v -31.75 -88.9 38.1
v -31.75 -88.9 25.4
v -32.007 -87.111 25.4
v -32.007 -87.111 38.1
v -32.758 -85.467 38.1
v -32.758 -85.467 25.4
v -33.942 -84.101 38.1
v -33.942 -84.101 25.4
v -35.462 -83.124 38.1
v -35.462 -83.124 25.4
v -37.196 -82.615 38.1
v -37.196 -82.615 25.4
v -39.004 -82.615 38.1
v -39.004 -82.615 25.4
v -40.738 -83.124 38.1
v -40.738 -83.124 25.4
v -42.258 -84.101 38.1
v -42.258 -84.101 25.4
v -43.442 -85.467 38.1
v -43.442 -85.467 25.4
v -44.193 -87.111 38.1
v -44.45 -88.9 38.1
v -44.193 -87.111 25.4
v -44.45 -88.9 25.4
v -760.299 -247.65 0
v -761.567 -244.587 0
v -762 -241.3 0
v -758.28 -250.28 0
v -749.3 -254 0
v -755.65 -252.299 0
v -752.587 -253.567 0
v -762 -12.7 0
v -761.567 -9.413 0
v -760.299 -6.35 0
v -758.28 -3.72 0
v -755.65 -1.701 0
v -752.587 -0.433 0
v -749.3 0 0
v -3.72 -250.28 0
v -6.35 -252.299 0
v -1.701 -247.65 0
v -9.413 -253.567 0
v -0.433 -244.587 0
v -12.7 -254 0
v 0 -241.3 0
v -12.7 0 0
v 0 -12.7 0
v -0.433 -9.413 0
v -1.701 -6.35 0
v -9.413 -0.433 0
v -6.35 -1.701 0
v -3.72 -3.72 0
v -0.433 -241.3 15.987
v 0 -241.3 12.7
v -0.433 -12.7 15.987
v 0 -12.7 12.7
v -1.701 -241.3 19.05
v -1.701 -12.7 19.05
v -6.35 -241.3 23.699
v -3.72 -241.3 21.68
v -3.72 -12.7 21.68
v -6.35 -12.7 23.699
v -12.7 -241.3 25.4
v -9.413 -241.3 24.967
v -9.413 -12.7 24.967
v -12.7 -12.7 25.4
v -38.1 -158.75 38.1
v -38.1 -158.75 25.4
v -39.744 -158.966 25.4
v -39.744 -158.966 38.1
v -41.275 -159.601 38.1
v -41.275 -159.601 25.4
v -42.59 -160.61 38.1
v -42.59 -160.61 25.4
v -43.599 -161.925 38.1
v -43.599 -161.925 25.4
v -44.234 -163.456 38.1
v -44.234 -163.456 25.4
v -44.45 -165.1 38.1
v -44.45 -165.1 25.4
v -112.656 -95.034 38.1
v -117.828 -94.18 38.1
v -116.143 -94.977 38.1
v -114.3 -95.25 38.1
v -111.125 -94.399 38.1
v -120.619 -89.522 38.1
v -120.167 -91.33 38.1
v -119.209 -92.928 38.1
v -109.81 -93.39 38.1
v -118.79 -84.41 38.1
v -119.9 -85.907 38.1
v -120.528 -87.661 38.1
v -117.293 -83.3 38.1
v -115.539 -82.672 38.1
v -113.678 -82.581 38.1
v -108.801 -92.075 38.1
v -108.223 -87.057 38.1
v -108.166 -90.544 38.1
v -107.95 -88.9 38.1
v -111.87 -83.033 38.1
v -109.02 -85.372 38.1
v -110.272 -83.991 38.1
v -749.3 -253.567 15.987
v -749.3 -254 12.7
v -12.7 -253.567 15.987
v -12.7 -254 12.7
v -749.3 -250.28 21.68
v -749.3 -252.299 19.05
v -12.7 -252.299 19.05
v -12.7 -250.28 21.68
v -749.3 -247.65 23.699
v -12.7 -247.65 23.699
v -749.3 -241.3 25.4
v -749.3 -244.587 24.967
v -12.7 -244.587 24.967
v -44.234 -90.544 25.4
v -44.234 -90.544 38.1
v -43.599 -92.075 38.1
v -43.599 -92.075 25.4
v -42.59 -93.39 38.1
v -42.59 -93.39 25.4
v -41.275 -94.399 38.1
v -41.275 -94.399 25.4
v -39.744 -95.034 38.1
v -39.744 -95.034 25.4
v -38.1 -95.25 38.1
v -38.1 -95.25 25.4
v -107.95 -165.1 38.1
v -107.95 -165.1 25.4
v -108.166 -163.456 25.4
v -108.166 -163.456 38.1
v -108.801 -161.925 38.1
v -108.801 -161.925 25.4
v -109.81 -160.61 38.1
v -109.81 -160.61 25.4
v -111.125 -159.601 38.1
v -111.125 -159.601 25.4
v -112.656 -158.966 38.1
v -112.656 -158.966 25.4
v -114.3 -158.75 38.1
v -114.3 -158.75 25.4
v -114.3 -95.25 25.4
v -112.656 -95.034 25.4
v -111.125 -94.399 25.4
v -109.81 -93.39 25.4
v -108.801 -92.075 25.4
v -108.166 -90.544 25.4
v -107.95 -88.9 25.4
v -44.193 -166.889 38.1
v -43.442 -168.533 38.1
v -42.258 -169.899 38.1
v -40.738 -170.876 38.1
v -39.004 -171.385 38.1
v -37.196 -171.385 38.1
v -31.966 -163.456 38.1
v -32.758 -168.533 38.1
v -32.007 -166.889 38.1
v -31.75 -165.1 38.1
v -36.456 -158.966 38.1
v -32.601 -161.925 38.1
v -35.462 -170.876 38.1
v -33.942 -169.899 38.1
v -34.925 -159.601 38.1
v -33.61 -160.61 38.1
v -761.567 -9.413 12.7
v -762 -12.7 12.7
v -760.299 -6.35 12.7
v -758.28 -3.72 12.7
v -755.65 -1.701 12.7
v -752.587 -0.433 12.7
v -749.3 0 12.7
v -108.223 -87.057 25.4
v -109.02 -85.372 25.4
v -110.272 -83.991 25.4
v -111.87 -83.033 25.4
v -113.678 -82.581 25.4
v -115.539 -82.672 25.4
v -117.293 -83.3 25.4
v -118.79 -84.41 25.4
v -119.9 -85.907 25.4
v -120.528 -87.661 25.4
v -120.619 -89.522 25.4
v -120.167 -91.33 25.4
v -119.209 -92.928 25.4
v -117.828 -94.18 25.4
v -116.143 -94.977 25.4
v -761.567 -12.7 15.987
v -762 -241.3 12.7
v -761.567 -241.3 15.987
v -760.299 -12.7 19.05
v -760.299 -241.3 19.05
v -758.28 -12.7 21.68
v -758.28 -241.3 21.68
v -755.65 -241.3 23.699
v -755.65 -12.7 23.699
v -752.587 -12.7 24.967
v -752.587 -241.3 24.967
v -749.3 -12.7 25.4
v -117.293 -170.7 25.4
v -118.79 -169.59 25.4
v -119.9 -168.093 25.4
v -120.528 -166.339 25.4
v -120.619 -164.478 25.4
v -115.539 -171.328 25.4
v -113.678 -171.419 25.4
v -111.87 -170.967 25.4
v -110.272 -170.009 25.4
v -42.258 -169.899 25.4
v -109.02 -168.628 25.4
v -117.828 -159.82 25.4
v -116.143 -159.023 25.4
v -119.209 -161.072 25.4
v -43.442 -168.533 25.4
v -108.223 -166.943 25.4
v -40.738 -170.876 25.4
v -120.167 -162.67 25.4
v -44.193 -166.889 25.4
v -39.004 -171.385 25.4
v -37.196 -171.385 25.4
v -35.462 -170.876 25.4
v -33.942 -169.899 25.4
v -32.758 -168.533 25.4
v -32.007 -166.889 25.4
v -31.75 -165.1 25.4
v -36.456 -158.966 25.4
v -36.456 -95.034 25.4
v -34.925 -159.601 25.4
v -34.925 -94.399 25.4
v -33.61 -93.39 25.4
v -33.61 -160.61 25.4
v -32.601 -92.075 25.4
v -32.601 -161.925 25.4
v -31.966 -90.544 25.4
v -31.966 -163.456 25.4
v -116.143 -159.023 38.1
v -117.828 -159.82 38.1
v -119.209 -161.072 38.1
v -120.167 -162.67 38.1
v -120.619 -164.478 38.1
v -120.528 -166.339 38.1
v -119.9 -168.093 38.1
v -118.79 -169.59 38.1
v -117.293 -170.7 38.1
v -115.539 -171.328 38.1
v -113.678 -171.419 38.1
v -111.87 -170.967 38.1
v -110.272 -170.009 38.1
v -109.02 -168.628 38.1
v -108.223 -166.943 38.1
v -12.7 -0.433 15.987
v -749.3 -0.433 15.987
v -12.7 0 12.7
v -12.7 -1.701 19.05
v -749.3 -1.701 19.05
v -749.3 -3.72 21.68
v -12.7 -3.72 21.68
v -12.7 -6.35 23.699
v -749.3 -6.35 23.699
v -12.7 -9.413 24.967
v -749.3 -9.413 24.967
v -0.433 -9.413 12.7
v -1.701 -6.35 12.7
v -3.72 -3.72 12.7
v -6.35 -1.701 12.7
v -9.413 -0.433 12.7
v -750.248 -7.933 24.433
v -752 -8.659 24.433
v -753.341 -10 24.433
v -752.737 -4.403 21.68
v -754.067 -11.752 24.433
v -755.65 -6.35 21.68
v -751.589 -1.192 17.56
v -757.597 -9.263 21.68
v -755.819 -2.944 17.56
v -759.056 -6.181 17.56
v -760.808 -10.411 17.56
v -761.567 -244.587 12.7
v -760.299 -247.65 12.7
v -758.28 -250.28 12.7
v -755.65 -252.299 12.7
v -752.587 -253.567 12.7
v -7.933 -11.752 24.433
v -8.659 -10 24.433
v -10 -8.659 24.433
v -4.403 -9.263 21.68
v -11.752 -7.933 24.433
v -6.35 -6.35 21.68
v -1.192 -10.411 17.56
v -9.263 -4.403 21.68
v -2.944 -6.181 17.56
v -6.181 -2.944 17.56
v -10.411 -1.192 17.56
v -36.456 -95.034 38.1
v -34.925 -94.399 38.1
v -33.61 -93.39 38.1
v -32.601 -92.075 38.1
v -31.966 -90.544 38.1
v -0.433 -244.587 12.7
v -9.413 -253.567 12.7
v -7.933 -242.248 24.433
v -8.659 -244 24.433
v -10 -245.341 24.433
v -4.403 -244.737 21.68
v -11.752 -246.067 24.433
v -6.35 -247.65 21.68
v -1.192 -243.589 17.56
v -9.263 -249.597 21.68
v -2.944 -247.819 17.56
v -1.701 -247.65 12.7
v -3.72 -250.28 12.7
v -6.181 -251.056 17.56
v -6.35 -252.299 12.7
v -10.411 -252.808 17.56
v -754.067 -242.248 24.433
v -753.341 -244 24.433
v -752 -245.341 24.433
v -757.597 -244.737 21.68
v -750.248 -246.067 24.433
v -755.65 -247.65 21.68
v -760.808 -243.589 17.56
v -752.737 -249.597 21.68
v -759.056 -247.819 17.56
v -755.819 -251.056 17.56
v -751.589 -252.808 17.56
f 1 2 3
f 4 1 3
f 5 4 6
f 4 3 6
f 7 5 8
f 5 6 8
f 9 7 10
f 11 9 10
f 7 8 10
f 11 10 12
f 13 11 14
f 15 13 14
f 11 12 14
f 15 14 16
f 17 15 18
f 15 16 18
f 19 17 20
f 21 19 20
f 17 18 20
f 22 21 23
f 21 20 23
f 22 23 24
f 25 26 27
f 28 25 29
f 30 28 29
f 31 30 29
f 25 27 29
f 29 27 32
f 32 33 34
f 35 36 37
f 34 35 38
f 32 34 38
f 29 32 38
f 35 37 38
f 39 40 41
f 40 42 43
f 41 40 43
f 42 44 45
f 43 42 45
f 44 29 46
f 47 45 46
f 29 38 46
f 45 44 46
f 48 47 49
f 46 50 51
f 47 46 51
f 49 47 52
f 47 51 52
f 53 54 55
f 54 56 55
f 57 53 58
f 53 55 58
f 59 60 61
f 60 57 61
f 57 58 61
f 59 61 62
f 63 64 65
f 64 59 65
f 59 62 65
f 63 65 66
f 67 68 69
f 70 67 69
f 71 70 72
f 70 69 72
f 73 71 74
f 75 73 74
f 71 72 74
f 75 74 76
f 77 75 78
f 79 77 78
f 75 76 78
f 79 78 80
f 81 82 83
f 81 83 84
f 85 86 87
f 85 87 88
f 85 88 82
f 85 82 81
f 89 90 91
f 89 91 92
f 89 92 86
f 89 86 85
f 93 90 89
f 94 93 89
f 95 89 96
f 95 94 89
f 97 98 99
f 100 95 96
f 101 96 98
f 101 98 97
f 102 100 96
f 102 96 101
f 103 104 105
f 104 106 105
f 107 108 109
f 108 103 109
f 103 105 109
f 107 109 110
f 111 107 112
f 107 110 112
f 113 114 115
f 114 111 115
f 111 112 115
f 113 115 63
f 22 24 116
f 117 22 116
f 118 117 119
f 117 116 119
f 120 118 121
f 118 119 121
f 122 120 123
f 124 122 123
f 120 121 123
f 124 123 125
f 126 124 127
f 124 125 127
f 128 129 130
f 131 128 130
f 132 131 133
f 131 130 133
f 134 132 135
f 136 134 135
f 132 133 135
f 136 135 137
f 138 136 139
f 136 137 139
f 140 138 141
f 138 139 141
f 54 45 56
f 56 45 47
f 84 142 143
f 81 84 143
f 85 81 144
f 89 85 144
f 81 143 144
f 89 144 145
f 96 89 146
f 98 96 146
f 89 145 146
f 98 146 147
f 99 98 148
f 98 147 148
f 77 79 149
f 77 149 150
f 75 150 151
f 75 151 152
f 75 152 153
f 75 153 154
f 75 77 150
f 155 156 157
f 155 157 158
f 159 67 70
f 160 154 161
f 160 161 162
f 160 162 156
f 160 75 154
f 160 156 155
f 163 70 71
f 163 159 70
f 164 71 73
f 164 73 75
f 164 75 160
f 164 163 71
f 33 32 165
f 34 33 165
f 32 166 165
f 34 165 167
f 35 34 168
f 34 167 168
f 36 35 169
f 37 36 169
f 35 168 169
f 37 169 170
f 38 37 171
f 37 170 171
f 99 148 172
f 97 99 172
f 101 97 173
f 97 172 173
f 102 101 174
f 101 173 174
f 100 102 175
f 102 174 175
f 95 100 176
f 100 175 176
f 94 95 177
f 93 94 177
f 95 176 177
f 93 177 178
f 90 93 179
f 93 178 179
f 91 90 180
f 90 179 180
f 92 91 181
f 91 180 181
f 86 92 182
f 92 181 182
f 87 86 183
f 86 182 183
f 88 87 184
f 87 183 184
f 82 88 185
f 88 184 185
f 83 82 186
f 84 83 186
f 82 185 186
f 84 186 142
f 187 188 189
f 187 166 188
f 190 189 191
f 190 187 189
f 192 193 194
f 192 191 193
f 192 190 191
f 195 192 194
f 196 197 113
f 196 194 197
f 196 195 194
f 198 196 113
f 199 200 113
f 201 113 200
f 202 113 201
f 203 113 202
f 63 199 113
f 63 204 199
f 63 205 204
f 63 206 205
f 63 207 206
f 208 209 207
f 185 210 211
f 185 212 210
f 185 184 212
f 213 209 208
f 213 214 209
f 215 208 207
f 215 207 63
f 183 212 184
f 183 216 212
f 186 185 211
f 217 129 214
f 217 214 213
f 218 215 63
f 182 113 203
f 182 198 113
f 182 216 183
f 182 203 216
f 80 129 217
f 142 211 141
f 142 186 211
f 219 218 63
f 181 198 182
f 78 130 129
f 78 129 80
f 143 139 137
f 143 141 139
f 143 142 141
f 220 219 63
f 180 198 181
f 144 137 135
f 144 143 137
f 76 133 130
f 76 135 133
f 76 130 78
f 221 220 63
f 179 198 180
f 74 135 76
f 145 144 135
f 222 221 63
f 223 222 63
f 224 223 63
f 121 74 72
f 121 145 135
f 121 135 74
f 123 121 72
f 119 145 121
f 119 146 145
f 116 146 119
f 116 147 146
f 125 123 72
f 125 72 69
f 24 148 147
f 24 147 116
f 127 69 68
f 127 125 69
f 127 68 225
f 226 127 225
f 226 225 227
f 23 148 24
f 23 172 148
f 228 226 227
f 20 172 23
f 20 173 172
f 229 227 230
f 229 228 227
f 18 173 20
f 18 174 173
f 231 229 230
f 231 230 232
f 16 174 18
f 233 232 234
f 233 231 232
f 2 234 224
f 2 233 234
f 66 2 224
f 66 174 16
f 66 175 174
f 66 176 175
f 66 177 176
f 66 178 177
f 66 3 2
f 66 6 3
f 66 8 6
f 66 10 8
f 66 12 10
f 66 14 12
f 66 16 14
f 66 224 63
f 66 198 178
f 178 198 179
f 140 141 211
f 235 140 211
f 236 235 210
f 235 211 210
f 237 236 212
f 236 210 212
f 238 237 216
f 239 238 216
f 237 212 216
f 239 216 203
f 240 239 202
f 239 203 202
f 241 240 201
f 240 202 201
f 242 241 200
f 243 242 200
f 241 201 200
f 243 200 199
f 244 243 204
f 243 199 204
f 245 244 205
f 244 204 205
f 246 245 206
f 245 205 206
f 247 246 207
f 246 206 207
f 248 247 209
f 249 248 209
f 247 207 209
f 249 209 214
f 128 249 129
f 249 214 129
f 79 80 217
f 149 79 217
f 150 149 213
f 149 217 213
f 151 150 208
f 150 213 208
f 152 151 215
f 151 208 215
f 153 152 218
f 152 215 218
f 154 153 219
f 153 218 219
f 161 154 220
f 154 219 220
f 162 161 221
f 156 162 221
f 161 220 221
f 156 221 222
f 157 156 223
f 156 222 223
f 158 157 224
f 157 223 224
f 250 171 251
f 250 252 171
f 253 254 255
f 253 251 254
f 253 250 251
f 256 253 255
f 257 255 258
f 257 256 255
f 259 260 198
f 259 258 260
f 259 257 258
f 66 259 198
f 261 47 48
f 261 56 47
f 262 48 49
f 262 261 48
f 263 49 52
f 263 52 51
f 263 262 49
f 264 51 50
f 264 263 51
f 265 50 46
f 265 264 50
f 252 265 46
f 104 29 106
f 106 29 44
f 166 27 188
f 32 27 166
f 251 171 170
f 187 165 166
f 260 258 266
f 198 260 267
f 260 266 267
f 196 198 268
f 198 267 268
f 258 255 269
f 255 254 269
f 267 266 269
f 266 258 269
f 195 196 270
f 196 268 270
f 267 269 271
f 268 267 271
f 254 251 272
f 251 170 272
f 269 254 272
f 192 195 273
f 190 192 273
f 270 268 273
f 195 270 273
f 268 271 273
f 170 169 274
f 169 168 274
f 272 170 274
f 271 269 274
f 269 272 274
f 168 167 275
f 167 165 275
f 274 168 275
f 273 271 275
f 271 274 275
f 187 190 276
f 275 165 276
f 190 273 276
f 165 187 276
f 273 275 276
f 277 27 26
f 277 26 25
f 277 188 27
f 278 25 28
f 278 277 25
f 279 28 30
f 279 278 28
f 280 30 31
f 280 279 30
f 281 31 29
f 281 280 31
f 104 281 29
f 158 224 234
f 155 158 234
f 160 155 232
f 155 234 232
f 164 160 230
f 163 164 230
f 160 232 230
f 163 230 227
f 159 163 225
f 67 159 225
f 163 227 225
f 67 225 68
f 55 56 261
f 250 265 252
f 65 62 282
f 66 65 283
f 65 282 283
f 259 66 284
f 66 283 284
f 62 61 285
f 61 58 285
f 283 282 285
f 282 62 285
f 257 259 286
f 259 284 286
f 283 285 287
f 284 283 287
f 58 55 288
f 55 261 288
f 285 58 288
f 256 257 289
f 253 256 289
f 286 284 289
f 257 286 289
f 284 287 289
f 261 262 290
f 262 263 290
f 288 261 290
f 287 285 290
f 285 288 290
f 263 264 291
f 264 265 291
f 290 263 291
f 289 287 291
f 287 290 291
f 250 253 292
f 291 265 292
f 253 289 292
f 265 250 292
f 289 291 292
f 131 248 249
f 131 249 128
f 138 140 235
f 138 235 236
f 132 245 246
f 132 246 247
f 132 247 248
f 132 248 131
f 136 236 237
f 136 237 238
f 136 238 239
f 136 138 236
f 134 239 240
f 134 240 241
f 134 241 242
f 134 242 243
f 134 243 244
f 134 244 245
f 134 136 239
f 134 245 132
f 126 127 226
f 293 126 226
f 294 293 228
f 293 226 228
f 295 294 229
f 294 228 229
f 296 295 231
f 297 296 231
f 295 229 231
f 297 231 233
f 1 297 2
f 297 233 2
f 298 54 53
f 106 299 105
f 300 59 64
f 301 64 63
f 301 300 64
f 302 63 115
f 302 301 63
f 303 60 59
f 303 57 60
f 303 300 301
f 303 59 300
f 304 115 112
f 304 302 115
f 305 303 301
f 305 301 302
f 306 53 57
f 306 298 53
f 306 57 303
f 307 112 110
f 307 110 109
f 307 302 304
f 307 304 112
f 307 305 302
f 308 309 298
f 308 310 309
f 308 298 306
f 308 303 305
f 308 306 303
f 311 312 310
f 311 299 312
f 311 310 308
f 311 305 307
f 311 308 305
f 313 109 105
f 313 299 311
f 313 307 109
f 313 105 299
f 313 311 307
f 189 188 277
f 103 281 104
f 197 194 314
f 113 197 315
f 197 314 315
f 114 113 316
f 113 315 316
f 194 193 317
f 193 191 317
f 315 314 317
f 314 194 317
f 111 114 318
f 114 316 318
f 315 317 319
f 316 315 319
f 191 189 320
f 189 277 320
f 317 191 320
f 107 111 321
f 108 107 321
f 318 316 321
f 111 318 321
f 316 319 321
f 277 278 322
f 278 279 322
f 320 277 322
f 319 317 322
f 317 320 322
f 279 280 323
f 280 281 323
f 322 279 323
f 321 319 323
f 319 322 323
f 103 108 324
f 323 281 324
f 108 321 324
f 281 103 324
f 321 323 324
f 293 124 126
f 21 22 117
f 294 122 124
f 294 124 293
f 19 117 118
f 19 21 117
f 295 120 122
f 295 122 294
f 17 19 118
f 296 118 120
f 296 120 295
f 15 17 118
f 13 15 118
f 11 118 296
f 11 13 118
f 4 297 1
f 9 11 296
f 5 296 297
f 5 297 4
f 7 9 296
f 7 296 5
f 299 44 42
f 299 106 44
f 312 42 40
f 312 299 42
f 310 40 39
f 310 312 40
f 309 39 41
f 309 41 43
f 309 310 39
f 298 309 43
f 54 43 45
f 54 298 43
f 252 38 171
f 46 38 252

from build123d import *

# Parameters (mm, degrees)
F0_W     = 762
F0_H     = 254
F1_DEPTH = 25.4
F3_R     = 12.7
F5_DEPTH = 12.7


# Not quite as in the source:
# - a feature of the source that left no trace in its solid (it failed there, or was rolled back) is left out


with BuildPart() as f1:
    # F0 (on Top) → F1 (new body)
    with BuildSketch(Plane.XY):
        with Locations((-381, -127)):
            Rectangle(F0_W, F0_H)
    extrude(amount=F1_DEPTH)

    # F3
    f3_edges = [f1.edges().sort_by_distance(p)[0] for p in [
        (-762, -254, 12.7),
        (0, -254, 12.7),
        (0, 0, 12.7),
        (0, -127, 25.4),
        (-762, 0, 12.7),
        (-381, 0, 25.4),
        (-762, -127, 25.4),
        (-381, -254, 25.4),
    ]]
    fillet(f3_edges, radius=F3_R)

    # F4 (on face) → F5 (join)
    with BuildSketch(Plane.XY.offset(25.4)):
        with BuildLine():
            Line((-44.45, -165.1), (-38.1, -165.1))
            Line((-38.1, -165.1), (-38.1, -158.75))
            ThreePointArc((-38.1, -158.75), (-42.5901280605, -160.6098719395), (-44.45, -165.1))
        make_face()
        with BuildLine():
            ThreePointArc((-44.45, -165.1), (-38.1, -171.45), (-31.75, -165.1))
            Line((-31.75, -165.1), (-38.1, -165.1))
            Line((-38.1, -165.1), (-44.45, -165.1))
        make_face()
        with BuildLine():
            Line((-38.1, -165.1), (-31.75, -165.1))
            ThreePointArc((-31.75, -165.1), (-33.6098719395, -160.6098719395), (-38.1, -158.75))
            Line((-38.1, -158.75), (-38.1, -165.1))
        make_face()
        with BuildLine():
            Line((-114.3, -165.1), (-107.95, -165.1))
            ThreePointArc((-107.95, -165.1), (-109.8098719395, -160.6098719395), (-114.3, -158.75))
            Line((-114.3, -158.75), (-114.3, -165.1))
        make_face()
        with BuildLine():
            ThreePointArc((-114.3, -158.75), (-118.7901280605, -169.5901280605), (-107.95, -165.1))
            Line((-107.95, -165.1), (-114.3, -165.1))
            Line((-114.3, -165.1), (-114.3, -158.75))
        make_face()
        with BuildLine():
            ThreePointArc((-114.3, -95.25), (-109.8098719395, -93.3901280605), (-107.95, -88.9))
            Line((-107.95, -88.9), (-114.3, -88.9))
            Line((-114.3, -88.9), (-114.3, -95.25))
        make_face()
        with BuildLine():
            Line((-114.3, -88.9), (-107.95, -88.9))
            ThreePointArc((-107.95, -88.9), (-118.7901280605, -84.4098719395), (-114.3, -95.25))
            Line((-114.3, -95.25), (-114.3, -88.9))
        make_face()
        with BuildLine():
            Line((-38.1, -88.9), (-31.75, -88.9))
            ThreePointArc((-31.75, -88.9), (-38.1, -82.55), (-44.45, -88.9))
            Line((-44.45, -88.9), (-38.1, -88.9))
        make_face()
        with BuildLine():
            Line((-38.1, -95.25), (-38.1, -88.9))
            Line((-38.1, -88.9), (-44.45, -88.9))
            ThreePointArc((-44.45, -88.9), (-42.5901280605, -93.3901280605), (-38.1, -95.25))
        make_face()
        with BuildLine():
            ThreePointArc((-38.1, -95.25), (-33.6098719395, -93.3901280605), (-31.75, -88.9))
            Line((-31.75, -88.9), (-38.1, -88.9))
            Line((-38.1, -88.9), (-38.1, -95.25))
        make_face()
    extrude(amount=F5_DEPTH)


solid = f1.part
